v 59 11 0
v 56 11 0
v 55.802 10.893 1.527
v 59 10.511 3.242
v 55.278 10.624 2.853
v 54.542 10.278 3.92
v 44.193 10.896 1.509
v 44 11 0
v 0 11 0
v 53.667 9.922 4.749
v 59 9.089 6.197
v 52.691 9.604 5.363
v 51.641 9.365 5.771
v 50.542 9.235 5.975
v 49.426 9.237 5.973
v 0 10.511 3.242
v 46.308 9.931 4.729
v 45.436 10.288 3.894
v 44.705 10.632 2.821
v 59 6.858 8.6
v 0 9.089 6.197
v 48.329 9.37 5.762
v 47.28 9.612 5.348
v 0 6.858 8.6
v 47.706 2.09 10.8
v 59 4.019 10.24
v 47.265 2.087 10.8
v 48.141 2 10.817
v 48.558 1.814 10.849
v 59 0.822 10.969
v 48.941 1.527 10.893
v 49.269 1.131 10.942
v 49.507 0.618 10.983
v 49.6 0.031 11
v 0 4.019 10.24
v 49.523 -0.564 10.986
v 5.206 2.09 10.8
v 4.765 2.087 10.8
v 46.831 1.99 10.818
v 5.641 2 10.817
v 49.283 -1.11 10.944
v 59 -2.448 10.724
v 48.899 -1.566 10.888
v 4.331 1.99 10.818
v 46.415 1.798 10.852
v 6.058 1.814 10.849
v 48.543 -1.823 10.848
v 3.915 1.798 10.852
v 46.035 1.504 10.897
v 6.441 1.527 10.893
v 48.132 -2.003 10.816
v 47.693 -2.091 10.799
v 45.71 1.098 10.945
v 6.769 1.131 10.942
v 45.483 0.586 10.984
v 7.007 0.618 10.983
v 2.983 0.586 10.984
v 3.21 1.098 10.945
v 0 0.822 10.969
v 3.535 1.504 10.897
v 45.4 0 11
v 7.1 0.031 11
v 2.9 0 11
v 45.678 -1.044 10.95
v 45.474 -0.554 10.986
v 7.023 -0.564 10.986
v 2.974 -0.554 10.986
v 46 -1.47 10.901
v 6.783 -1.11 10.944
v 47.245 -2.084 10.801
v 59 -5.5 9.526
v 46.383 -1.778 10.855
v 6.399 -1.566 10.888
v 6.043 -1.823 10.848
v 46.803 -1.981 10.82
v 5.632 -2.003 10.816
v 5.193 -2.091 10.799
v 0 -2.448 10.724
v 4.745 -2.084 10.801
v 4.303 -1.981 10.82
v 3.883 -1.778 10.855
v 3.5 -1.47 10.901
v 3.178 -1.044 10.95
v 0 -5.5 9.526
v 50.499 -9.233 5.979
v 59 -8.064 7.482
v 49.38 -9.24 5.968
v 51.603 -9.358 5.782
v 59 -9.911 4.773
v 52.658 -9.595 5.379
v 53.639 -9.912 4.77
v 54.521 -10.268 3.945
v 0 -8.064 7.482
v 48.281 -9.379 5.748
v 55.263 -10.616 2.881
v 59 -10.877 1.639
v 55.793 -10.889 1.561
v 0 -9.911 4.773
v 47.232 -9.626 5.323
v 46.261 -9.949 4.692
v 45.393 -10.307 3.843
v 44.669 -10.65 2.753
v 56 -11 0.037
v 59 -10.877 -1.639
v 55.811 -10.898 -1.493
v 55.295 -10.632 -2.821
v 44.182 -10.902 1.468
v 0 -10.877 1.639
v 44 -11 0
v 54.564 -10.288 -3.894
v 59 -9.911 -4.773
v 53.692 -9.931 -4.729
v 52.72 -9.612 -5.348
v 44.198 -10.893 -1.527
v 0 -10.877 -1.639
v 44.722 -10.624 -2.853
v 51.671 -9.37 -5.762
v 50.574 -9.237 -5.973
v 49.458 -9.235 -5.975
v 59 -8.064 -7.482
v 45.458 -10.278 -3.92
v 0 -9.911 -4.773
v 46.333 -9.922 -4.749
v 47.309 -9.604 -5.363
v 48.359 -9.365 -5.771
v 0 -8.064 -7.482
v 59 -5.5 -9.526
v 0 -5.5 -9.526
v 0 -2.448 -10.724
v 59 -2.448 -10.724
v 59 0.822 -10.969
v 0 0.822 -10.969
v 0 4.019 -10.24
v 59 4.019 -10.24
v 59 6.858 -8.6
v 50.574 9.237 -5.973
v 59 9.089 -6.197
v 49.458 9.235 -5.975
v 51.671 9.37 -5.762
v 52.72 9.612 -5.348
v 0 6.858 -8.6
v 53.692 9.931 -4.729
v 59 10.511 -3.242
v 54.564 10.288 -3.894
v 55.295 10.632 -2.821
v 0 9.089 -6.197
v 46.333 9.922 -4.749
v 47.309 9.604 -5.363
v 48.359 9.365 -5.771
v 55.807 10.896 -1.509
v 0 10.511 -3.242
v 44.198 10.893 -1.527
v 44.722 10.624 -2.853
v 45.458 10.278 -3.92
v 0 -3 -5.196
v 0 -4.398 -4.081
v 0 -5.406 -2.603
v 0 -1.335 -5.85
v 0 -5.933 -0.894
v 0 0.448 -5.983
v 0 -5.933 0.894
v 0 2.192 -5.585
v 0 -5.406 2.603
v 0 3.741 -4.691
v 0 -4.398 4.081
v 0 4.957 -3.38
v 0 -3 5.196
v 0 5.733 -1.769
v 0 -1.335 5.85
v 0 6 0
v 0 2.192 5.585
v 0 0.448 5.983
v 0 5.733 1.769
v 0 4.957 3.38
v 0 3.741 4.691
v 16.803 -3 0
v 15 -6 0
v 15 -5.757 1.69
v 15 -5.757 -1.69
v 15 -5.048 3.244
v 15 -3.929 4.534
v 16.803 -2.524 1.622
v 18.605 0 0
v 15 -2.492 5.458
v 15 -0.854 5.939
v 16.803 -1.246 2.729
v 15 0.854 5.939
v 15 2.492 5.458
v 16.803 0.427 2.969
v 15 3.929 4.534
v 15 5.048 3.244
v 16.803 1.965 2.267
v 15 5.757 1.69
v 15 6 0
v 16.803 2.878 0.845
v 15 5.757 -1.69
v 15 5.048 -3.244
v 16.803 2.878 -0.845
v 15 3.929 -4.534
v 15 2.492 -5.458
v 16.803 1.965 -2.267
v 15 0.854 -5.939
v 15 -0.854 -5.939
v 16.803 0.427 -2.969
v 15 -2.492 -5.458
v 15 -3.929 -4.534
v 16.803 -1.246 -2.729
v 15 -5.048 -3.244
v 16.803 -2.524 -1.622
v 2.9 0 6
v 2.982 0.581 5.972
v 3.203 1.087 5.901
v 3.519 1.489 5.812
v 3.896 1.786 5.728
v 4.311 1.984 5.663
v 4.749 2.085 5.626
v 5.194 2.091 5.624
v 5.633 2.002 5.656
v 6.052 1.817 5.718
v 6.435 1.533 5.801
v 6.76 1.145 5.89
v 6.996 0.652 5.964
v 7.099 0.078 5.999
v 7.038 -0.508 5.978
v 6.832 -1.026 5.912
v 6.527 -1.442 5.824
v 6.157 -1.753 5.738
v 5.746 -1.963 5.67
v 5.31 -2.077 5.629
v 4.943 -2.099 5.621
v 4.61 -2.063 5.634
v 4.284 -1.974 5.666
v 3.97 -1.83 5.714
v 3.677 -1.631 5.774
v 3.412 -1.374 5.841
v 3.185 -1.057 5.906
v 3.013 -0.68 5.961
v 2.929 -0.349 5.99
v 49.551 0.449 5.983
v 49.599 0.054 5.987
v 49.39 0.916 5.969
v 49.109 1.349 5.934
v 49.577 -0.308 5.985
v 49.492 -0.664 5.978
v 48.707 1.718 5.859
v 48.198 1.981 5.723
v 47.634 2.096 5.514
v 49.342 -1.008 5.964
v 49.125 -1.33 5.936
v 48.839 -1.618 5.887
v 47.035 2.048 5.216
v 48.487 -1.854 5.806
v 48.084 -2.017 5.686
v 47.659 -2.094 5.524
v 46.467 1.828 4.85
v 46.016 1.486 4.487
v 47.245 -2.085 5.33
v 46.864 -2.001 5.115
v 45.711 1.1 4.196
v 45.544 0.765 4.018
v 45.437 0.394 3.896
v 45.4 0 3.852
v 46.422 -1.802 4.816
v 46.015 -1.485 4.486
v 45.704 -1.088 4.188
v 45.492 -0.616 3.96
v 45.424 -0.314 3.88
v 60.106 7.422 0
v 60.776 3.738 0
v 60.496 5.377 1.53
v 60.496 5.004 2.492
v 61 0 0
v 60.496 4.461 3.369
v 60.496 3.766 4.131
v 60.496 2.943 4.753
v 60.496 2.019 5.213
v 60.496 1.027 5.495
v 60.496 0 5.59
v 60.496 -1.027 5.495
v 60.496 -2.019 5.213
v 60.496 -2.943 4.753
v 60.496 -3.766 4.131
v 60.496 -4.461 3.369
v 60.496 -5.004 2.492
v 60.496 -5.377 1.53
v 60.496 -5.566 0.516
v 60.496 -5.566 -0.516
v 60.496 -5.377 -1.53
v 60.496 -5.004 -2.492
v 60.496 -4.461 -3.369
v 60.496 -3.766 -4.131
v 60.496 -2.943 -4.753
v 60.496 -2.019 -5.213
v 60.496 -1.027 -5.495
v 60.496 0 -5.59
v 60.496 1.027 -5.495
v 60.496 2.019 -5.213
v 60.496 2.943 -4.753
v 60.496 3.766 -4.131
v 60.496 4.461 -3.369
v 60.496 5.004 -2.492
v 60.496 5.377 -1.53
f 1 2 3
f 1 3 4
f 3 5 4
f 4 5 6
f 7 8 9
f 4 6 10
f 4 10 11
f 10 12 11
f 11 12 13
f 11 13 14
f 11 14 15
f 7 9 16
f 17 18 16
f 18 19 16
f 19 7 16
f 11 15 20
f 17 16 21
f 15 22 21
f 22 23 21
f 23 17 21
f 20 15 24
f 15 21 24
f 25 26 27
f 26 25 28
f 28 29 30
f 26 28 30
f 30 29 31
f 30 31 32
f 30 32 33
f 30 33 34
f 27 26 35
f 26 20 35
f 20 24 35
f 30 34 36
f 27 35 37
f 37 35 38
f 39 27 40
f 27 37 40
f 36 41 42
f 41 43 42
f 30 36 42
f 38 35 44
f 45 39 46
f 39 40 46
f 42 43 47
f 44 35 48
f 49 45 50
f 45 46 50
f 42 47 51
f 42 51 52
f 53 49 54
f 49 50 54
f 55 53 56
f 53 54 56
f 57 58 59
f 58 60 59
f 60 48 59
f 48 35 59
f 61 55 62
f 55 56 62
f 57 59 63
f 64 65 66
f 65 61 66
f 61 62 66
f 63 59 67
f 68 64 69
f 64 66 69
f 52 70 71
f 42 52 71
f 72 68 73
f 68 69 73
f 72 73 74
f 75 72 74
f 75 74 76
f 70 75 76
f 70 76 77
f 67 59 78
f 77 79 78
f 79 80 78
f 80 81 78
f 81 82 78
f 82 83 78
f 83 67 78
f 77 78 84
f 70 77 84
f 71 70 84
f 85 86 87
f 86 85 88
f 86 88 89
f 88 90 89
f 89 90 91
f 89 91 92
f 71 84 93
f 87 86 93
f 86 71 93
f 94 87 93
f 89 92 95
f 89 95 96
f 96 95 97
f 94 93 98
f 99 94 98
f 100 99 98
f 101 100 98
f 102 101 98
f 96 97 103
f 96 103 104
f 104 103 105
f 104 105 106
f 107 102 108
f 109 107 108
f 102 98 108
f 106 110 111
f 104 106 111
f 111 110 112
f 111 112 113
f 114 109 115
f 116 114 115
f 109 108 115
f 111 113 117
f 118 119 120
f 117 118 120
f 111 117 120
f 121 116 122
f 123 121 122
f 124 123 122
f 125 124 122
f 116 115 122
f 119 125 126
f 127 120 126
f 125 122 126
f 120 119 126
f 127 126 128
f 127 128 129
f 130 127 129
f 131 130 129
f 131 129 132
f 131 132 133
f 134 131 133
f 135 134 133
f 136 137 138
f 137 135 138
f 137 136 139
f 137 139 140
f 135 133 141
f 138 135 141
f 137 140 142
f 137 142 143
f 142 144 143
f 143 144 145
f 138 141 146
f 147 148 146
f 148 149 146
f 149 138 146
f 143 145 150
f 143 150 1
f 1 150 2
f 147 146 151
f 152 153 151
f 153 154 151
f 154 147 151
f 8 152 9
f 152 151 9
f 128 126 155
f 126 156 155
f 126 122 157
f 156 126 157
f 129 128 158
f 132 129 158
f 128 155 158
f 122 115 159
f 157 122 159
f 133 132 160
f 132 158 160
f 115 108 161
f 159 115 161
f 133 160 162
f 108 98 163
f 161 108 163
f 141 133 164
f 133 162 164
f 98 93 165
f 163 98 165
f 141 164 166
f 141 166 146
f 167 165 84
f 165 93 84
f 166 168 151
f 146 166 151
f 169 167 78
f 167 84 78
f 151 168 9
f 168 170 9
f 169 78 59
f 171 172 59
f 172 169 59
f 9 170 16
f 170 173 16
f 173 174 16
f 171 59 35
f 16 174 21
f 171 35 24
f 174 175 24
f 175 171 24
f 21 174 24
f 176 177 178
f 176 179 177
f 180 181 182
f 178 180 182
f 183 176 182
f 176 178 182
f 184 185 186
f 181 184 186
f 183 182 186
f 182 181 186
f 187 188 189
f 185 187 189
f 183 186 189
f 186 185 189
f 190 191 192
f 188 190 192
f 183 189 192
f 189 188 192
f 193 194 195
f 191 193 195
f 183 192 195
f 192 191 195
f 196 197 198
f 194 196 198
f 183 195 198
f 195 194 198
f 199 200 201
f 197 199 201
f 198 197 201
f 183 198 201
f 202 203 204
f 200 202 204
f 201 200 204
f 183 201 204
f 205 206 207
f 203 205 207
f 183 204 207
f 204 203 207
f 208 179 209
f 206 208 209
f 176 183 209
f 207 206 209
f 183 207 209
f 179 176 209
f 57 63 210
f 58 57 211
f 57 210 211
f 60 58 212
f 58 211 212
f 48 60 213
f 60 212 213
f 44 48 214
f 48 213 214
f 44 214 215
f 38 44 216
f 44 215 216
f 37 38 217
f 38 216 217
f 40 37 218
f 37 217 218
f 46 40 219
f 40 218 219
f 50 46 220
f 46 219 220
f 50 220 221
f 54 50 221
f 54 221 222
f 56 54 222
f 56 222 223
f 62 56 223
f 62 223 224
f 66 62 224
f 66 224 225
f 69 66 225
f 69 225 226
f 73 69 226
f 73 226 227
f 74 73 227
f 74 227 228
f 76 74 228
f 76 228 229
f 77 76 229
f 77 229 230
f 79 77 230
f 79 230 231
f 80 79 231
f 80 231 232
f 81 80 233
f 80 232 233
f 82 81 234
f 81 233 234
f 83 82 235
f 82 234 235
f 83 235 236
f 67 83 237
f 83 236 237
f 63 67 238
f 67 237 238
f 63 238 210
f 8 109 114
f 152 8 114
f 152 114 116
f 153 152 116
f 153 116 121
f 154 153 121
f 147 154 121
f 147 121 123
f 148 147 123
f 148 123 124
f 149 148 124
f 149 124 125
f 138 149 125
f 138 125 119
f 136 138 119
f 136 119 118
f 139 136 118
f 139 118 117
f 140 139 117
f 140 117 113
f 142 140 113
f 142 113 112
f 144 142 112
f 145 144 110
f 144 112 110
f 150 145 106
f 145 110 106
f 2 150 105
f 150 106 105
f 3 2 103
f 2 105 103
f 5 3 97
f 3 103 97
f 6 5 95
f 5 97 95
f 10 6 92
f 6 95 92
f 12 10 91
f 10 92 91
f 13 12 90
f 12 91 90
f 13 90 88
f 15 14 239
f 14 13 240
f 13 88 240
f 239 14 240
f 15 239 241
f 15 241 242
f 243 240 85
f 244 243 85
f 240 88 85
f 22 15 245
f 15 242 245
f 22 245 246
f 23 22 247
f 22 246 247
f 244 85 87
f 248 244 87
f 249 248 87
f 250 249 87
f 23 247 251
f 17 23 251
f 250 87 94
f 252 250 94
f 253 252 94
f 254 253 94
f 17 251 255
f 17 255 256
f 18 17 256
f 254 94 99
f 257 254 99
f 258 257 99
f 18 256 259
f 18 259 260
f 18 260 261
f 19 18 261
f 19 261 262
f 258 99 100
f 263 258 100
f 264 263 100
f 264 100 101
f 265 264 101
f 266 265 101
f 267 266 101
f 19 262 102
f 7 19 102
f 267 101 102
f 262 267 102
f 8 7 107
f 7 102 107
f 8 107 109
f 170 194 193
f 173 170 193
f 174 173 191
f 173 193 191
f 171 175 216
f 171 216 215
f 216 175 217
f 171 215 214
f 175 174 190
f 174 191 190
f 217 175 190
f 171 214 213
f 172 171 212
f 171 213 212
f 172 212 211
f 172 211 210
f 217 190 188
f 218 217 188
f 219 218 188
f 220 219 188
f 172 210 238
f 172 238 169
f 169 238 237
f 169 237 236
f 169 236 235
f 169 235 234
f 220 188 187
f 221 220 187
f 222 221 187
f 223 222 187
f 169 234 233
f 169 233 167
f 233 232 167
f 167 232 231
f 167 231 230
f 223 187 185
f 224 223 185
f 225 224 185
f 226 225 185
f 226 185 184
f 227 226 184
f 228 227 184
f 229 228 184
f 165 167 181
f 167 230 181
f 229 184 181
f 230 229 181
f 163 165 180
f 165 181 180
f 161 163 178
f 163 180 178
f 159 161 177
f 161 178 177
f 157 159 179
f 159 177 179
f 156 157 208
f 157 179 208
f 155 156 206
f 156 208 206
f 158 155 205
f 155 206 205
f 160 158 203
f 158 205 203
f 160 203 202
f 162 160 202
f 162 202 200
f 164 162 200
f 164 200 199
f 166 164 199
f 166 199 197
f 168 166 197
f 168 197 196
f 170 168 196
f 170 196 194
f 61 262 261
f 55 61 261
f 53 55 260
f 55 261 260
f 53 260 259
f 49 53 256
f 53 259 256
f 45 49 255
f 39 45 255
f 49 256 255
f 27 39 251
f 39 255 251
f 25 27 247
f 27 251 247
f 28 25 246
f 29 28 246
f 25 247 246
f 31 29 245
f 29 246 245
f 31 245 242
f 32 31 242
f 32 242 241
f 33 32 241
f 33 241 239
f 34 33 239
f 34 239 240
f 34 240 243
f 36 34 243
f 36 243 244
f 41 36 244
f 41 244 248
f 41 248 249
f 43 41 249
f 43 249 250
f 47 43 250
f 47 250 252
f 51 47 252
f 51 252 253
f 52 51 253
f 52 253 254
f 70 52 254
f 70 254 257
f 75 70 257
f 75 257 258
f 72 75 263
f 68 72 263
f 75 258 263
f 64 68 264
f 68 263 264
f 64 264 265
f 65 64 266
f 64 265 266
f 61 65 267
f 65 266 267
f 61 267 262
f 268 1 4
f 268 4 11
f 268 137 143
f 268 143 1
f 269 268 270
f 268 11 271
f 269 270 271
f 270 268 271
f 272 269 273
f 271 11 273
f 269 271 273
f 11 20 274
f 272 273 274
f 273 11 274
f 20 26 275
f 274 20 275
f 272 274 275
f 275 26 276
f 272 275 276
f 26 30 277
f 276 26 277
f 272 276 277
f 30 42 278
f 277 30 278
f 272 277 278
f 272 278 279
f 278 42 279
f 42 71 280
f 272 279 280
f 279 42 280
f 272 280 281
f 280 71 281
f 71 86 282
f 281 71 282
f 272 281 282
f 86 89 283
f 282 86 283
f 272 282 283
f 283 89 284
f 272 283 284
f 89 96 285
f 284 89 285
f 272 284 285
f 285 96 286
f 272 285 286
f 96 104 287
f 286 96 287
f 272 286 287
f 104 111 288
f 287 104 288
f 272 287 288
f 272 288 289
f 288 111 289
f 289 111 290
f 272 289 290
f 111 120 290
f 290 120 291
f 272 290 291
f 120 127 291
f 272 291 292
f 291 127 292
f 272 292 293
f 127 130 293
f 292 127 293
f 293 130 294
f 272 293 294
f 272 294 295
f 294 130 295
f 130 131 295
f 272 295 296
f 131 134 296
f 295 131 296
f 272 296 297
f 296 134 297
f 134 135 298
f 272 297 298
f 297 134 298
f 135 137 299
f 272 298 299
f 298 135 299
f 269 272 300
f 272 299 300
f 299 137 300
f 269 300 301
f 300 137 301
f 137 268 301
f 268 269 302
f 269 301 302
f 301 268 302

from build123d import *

# Parameters (mm, degrees)
F3_D     = 12
F3_DEPTH = 15
F3_TIP   = 3.6051637142
F6_D     = 12
F9_D     = 4.2
F9_DEPTH = 12
F9_START = 4.2023152
F9_TIP   = 1.2618073


with BuildPart() as f1:
    # F0 (on Top) → F1 (revolve)
    with BuildSketch(Plane.XY):
        with BuildLine():
            Line((0, 11), (0, 0))
            Line((0, 0), (61, 0))
            ThreePointArc((61, 0), (60.4959346906, 5.5901699437), (59, 11))
            Line((59, 11), (0, 11))
        make_face()
    revolve(axis=Axis((30.5, 0, 0), (1, 0, 0)))

    # F3
    with Locations(Plane(origin=(0, 0, 0), x_dir=(0, -1, 0), z_dir=(-1, 0, 0))):
        with Locations((0, 0)):
            Hole(F3_D / 2, depth=F3_DEPTH)
            with Locations((0, 0, -(F3_DEPTH + F3_TIP / 2))):  # 118° drill point
                Cone(0, F3_D / 2, F3_TIP, mode=Mode.SUBTRACT)

    # F6 (through all)
    with Locations(Plane(origin=(0, 15, 0), x_dir=(1, 0, 0), z_dir=(0, 1, 0))):
        with Locations((50, 0)):
            Hole(F6_D / 2)

    # F9
    # its depths count from where the whole tool has entered the part; down to there all is cleared
    with Locations(Plane.XY.offset(15).offset(-F9_START)):
        with Locations((5, 0), (47.5, 0)):
            Hole(F9_D / 2, depth=F9_DEPTH)
            with Locations((0, 0, -(F9_DEPTH + F9_TIP / 2))):  # 118° drill point
                Cone(0, F9_D / 2, F9_TIP, mode=Mode.SUBTRACT)


solid = f1.part
